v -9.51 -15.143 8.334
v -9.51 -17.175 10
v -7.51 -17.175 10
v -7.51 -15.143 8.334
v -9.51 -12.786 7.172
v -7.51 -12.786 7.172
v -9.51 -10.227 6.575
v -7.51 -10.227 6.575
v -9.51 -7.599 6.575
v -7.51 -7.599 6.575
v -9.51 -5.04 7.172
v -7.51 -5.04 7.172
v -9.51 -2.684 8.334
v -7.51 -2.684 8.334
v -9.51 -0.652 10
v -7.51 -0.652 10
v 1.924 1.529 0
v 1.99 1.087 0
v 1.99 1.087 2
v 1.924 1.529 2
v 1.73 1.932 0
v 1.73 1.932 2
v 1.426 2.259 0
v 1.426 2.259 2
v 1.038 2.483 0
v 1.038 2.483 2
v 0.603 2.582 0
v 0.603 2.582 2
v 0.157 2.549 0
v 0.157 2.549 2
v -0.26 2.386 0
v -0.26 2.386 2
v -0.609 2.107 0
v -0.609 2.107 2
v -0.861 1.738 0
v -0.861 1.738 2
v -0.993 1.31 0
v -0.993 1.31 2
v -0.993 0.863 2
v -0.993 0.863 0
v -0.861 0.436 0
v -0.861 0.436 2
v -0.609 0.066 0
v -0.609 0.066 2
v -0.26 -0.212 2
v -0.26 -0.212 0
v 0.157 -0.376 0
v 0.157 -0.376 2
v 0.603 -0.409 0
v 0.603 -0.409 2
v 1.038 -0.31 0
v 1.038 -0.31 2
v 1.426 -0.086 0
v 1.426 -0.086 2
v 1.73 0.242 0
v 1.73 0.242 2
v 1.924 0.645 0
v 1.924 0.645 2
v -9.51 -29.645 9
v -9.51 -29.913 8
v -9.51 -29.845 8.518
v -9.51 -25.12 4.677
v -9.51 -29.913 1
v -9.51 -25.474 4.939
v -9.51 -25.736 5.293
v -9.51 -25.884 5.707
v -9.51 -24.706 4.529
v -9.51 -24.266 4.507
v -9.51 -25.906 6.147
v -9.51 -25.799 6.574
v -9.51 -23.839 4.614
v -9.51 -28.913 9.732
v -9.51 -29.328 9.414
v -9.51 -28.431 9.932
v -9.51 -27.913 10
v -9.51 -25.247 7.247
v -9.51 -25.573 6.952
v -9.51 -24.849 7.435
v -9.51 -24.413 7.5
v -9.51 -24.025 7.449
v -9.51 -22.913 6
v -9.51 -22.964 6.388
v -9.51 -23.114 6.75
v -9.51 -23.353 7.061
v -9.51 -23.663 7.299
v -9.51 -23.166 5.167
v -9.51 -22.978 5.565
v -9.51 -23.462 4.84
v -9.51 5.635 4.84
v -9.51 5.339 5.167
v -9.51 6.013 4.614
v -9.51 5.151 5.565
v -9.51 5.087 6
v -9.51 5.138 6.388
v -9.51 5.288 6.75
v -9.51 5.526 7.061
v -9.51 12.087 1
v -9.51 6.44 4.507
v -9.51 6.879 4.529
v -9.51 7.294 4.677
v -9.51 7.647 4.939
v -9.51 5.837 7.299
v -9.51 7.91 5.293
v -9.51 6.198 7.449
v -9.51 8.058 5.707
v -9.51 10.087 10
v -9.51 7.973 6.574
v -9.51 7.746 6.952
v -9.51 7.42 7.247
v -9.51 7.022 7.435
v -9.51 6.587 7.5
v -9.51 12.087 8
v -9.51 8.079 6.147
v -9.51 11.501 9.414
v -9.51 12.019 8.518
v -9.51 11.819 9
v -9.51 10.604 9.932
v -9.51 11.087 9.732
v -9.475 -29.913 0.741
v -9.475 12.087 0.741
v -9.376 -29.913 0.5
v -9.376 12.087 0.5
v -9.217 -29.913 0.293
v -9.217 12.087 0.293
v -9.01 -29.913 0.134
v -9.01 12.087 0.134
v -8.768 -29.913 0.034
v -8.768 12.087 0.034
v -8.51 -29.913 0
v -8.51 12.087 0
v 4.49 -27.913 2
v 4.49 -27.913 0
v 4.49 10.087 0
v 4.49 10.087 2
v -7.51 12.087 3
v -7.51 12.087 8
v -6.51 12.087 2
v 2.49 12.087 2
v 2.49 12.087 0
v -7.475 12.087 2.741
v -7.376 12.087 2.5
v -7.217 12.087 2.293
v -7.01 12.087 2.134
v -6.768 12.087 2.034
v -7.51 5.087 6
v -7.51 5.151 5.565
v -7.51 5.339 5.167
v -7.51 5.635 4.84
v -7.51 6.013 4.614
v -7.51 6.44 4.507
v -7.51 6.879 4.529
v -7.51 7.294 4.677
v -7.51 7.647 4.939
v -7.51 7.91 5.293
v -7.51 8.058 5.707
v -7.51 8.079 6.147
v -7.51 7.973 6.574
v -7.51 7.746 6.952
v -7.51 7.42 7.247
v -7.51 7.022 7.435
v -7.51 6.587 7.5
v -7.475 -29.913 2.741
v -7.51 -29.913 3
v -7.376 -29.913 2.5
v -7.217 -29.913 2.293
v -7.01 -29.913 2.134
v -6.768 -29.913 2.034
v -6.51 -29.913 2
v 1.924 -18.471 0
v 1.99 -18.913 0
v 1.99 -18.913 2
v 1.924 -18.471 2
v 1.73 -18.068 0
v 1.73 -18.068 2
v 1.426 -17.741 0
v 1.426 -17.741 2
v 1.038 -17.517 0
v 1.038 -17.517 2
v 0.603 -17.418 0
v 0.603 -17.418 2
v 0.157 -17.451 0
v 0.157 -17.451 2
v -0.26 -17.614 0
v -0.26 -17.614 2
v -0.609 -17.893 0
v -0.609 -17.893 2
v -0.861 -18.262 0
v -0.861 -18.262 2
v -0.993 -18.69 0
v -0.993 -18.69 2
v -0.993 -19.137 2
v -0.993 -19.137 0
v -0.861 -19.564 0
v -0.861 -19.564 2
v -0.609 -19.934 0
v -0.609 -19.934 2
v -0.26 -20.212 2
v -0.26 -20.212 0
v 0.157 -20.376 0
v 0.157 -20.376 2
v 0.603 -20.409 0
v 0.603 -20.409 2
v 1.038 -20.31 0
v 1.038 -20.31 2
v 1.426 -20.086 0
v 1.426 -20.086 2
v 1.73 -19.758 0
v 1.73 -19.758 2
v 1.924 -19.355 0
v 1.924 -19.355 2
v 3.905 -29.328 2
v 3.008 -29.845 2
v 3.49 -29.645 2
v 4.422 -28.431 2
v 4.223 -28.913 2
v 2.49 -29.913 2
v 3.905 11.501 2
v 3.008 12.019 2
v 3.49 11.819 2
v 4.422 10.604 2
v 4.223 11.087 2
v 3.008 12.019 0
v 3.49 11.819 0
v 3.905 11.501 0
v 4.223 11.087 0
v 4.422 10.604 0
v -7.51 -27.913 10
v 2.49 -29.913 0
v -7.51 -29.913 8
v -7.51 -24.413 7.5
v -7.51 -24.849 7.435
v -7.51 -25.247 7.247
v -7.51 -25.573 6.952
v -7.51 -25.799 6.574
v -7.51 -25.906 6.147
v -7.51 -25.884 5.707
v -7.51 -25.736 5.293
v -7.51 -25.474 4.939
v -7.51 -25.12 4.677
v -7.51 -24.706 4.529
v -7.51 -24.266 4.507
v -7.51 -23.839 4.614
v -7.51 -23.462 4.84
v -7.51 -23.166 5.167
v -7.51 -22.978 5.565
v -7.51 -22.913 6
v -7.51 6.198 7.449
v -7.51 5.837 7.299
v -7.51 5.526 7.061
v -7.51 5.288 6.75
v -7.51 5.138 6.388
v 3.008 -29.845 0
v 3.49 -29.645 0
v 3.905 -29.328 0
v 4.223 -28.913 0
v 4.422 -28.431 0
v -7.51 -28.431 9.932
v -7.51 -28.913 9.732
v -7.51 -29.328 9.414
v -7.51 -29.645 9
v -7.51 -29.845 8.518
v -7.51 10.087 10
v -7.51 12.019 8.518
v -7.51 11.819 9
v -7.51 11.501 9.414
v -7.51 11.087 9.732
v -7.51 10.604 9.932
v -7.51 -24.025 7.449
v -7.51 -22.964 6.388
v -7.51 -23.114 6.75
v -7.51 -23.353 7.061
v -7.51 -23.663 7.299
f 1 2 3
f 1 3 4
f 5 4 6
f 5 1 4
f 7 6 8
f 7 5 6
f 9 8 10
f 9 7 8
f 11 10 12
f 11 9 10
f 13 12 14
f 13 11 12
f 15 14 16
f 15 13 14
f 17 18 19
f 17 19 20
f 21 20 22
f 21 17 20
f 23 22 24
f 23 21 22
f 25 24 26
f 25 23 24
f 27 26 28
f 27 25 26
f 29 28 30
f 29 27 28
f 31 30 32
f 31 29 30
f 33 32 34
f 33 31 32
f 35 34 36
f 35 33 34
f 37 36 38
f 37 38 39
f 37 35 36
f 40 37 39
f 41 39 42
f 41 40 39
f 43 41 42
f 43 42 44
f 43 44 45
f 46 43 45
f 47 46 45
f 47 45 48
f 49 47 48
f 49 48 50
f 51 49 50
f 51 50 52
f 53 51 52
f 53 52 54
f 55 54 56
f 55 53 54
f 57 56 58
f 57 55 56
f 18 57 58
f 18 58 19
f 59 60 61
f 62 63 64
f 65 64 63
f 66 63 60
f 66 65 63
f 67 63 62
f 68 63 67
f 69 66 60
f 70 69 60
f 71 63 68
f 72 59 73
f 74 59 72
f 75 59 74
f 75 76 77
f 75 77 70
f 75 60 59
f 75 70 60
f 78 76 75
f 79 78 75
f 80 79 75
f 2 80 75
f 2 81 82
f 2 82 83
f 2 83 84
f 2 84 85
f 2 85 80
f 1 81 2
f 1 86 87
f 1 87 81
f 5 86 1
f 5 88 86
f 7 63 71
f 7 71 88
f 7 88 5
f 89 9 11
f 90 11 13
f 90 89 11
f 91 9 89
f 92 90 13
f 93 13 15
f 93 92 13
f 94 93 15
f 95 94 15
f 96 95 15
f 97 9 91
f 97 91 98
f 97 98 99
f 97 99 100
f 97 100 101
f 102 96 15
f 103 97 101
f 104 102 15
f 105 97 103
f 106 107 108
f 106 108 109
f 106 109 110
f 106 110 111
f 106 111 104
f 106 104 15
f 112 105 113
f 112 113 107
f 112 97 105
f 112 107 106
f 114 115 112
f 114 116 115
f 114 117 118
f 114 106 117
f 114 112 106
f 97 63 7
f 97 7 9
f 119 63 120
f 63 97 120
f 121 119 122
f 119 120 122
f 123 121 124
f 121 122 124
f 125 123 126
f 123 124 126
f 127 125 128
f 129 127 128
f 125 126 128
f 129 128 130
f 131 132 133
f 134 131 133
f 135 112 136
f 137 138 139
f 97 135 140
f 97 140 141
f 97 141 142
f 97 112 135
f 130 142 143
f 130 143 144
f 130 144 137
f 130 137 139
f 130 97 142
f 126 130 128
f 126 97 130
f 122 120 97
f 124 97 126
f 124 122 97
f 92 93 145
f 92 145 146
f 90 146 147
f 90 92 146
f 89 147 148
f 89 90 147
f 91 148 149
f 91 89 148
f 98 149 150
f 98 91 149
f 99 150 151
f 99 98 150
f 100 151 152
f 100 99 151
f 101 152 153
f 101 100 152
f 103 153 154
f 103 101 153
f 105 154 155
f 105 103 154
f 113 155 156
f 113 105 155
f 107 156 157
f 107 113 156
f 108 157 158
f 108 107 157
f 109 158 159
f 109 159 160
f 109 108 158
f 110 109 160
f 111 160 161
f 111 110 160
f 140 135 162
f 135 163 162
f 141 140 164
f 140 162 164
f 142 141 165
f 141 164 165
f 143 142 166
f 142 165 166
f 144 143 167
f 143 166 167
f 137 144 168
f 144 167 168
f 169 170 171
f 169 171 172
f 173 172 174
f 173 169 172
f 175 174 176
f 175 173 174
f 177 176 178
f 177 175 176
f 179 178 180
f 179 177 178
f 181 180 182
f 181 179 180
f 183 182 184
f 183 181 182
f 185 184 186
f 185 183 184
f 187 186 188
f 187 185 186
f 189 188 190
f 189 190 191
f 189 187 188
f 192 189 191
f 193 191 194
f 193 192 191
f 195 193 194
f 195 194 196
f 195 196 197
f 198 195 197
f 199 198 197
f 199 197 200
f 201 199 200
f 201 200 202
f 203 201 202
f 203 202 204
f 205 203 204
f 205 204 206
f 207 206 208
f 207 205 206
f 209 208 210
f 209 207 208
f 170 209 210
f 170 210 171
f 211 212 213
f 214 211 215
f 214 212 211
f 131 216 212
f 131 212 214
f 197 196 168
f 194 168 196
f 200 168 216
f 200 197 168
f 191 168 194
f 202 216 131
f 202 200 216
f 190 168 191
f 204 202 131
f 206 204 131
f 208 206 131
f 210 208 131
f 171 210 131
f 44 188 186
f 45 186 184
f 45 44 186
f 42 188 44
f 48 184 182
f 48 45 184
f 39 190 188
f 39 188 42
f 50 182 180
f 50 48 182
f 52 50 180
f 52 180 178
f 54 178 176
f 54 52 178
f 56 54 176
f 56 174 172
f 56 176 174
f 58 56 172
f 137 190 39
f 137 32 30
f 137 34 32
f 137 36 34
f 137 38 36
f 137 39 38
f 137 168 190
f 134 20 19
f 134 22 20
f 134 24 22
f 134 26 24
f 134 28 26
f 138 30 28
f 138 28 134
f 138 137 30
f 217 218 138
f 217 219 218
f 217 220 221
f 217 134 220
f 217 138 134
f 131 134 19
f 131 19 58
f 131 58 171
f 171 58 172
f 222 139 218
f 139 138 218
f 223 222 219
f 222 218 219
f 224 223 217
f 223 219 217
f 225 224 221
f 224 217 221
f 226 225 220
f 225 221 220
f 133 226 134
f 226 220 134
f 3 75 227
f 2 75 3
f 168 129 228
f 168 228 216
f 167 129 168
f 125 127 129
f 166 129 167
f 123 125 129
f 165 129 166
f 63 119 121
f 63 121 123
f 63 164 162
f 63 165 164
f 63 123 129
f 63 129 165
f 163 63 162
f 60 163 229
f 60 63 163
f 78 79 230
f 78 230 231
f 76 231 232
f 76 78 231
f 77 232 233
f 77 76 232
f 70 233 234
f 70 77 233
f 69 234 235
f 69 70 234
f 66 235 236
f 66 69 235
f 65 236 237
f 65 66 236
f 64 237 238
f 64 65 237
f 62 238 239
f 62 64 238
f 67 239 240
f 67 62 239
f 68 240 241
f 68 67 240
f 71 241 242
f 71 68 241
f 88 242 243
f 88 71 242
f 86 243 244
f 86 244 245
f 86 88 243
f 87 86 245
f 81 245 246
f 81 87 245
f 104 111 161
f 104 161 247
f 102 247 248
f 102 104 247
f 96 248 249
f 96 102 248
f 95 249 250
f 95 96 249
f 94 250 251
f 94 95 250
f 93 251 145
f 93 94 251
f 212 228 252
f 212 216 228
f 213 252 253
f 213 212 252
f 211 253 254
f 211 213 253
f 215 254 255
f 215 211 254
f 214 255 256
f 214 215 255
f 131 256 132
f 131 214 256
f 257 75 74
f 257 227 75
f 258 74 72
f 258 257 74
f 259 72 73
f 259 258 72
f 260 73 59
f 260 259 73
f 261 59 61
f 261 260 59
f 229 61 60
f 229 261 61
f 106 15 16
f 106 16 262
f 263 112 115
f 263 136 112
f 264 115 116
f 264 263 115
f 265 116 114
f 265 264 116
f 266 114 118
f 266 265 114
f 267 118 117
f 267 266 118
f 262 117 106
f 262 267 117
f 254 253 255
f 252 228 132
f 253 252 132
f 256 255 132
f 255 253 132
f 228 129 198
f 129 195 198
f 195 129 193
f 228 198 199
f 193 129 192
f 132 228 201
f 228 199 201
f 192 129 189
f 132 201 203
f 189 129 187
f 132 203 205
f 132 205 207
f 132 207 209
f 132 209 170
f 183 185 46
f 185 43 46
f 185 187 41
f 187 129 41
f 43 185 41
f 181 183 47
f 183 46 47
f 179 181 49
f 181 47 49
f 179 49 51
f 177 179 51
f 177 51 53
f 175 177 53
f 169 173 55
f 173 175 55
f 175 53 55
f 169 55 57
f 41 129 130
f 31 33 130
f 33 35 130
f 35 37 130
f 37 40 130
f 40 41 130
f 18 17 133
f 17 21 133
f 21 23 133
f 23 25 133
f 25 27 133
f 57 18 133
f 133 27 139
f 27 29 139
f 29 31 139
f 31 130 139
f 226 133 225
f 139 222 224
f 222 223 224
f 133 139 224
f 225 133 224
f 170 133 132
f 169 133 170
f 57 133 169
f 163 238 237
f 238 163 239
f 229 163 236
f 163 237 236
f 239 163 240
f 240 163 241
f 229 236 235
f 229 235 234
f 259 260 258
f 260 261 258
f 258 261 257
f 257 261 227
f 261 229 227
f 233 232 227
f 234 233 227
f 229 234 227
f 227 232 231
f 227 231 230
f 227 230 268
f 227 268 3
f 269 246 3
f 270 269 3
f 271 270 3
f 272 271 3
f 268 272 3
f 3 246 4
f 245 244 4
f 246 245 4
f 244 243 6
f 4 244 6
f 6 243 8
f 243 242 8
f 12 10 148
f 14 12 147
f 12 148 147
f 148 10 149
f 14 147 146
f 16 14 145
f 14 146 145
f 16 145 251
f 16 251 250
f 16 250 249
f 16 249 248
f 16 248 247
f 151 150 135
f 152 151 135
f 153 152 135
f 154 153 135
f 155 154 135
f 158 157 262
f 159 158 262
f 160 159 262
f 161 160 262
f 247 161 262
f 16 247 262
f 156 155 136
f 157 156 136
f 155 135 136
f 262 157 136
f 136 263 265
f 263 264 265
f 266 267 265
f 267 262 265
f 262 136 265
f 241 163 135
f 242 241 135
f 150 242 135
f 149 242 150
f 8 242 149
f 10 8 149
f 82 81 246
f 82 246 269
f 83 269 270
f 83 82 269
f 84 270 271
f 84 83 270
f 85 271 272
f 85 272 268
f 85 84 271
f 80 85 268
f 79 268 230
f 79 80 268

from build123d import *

# Parameters (mm, degrees)
SKETCH_1_W      = 14
SKETCH_1_H      = 42
SKETCH_1_R      = 1.5
EXTRUDE_1_DEPTH = 2
EXTRUDE_2_DEPTH = 2
FILLET_1_R      = 2
FILLET_2_R      = 1


with BuildPart() as part:
    # 草图1 → 凸台-拉伸1 (new body)
    with BuildSketch(Plane.XY):
        with Locations((-2.509513742, -8.913319239)):
            Rectangle(SKETCH_1_W, SKETCH_1_H)
        with Locations((0.490486258, 1.086680761)):
            Circle(SKETCH_1_R, mode=Mode.SUBTRACT)
        with Locations((0.490486258, -18.913319239)):
            Circle(SKETCH_1_R, mode=Mode.SUBTRACT)
    extrude(amount=EXTRUDE_1_DEPTH)

    # 草图2 → 凸台-拉伸2 (add)
    with BuildSketch(Plane.ZY.offset(9.509513742)):
        with BuildLine():
            Line((10, 12.086680761), (2, 12.086680761))
            Line((2, 12.086680761), (2, -29.913319239))
            Line((2, -29.913319239), (10, -29.913319239))
            Line((10, -29.913319239), (10, -17.17467506))
            ThreePointArc((10, -17.17467506), (6.5, -8.913319239), (10, -0.651963418))
            Line((10, -0.651963418), (10, 12.086680761))
        make_face()
        with BuildLine():
            ThreePointArc((7.5, -24.413319239), (4.939339828, -25.473979411), (6, -22.913319239))
            ThreePointArc((6, -22.913319239), (7.060660172, -23.352659067), (7.5, -24.413319239))
        make_face(mode=Mode.SUBTRACT)
        with BuildLine():
            ThreePointArc((7.5, 6.586680761), (7.060660172, 5.526020589), (6, 5.086680761))
            ThreePointArc((6, 5.086680761), (4.939339828, 7.647340933), (7.5, 6.586680761))
        make_face(mode=Mode.SUBTRACT)
    extrude(amount=-EXTRUDE_2_DEPTH)

    # 圆角1
    fillet_1_edges = [part.edges().sort_by_distance(p)[0] for p in [
        (4.490486258, -29.913319239, 1),
        (4.490486258, 12.086680761, 1),
        (-8.509513742, -29.913319239, 10),
        (-8.509513742, 12.086680761, 10),
    ]]
    fillet(fillet_1_edges, radius=FILLET_1_R)

    # 圆角2
    fillet_2_edges = [part.edges().sort_by_distance(p)[0] for p in [
        (-7.509513742, -8.913319239, 2),
        (-9.509513742, -8.913319239, 0),
    ]]
    fillet(fillet_2_edges, radius=FILLET_2_R)


solid = part.part
